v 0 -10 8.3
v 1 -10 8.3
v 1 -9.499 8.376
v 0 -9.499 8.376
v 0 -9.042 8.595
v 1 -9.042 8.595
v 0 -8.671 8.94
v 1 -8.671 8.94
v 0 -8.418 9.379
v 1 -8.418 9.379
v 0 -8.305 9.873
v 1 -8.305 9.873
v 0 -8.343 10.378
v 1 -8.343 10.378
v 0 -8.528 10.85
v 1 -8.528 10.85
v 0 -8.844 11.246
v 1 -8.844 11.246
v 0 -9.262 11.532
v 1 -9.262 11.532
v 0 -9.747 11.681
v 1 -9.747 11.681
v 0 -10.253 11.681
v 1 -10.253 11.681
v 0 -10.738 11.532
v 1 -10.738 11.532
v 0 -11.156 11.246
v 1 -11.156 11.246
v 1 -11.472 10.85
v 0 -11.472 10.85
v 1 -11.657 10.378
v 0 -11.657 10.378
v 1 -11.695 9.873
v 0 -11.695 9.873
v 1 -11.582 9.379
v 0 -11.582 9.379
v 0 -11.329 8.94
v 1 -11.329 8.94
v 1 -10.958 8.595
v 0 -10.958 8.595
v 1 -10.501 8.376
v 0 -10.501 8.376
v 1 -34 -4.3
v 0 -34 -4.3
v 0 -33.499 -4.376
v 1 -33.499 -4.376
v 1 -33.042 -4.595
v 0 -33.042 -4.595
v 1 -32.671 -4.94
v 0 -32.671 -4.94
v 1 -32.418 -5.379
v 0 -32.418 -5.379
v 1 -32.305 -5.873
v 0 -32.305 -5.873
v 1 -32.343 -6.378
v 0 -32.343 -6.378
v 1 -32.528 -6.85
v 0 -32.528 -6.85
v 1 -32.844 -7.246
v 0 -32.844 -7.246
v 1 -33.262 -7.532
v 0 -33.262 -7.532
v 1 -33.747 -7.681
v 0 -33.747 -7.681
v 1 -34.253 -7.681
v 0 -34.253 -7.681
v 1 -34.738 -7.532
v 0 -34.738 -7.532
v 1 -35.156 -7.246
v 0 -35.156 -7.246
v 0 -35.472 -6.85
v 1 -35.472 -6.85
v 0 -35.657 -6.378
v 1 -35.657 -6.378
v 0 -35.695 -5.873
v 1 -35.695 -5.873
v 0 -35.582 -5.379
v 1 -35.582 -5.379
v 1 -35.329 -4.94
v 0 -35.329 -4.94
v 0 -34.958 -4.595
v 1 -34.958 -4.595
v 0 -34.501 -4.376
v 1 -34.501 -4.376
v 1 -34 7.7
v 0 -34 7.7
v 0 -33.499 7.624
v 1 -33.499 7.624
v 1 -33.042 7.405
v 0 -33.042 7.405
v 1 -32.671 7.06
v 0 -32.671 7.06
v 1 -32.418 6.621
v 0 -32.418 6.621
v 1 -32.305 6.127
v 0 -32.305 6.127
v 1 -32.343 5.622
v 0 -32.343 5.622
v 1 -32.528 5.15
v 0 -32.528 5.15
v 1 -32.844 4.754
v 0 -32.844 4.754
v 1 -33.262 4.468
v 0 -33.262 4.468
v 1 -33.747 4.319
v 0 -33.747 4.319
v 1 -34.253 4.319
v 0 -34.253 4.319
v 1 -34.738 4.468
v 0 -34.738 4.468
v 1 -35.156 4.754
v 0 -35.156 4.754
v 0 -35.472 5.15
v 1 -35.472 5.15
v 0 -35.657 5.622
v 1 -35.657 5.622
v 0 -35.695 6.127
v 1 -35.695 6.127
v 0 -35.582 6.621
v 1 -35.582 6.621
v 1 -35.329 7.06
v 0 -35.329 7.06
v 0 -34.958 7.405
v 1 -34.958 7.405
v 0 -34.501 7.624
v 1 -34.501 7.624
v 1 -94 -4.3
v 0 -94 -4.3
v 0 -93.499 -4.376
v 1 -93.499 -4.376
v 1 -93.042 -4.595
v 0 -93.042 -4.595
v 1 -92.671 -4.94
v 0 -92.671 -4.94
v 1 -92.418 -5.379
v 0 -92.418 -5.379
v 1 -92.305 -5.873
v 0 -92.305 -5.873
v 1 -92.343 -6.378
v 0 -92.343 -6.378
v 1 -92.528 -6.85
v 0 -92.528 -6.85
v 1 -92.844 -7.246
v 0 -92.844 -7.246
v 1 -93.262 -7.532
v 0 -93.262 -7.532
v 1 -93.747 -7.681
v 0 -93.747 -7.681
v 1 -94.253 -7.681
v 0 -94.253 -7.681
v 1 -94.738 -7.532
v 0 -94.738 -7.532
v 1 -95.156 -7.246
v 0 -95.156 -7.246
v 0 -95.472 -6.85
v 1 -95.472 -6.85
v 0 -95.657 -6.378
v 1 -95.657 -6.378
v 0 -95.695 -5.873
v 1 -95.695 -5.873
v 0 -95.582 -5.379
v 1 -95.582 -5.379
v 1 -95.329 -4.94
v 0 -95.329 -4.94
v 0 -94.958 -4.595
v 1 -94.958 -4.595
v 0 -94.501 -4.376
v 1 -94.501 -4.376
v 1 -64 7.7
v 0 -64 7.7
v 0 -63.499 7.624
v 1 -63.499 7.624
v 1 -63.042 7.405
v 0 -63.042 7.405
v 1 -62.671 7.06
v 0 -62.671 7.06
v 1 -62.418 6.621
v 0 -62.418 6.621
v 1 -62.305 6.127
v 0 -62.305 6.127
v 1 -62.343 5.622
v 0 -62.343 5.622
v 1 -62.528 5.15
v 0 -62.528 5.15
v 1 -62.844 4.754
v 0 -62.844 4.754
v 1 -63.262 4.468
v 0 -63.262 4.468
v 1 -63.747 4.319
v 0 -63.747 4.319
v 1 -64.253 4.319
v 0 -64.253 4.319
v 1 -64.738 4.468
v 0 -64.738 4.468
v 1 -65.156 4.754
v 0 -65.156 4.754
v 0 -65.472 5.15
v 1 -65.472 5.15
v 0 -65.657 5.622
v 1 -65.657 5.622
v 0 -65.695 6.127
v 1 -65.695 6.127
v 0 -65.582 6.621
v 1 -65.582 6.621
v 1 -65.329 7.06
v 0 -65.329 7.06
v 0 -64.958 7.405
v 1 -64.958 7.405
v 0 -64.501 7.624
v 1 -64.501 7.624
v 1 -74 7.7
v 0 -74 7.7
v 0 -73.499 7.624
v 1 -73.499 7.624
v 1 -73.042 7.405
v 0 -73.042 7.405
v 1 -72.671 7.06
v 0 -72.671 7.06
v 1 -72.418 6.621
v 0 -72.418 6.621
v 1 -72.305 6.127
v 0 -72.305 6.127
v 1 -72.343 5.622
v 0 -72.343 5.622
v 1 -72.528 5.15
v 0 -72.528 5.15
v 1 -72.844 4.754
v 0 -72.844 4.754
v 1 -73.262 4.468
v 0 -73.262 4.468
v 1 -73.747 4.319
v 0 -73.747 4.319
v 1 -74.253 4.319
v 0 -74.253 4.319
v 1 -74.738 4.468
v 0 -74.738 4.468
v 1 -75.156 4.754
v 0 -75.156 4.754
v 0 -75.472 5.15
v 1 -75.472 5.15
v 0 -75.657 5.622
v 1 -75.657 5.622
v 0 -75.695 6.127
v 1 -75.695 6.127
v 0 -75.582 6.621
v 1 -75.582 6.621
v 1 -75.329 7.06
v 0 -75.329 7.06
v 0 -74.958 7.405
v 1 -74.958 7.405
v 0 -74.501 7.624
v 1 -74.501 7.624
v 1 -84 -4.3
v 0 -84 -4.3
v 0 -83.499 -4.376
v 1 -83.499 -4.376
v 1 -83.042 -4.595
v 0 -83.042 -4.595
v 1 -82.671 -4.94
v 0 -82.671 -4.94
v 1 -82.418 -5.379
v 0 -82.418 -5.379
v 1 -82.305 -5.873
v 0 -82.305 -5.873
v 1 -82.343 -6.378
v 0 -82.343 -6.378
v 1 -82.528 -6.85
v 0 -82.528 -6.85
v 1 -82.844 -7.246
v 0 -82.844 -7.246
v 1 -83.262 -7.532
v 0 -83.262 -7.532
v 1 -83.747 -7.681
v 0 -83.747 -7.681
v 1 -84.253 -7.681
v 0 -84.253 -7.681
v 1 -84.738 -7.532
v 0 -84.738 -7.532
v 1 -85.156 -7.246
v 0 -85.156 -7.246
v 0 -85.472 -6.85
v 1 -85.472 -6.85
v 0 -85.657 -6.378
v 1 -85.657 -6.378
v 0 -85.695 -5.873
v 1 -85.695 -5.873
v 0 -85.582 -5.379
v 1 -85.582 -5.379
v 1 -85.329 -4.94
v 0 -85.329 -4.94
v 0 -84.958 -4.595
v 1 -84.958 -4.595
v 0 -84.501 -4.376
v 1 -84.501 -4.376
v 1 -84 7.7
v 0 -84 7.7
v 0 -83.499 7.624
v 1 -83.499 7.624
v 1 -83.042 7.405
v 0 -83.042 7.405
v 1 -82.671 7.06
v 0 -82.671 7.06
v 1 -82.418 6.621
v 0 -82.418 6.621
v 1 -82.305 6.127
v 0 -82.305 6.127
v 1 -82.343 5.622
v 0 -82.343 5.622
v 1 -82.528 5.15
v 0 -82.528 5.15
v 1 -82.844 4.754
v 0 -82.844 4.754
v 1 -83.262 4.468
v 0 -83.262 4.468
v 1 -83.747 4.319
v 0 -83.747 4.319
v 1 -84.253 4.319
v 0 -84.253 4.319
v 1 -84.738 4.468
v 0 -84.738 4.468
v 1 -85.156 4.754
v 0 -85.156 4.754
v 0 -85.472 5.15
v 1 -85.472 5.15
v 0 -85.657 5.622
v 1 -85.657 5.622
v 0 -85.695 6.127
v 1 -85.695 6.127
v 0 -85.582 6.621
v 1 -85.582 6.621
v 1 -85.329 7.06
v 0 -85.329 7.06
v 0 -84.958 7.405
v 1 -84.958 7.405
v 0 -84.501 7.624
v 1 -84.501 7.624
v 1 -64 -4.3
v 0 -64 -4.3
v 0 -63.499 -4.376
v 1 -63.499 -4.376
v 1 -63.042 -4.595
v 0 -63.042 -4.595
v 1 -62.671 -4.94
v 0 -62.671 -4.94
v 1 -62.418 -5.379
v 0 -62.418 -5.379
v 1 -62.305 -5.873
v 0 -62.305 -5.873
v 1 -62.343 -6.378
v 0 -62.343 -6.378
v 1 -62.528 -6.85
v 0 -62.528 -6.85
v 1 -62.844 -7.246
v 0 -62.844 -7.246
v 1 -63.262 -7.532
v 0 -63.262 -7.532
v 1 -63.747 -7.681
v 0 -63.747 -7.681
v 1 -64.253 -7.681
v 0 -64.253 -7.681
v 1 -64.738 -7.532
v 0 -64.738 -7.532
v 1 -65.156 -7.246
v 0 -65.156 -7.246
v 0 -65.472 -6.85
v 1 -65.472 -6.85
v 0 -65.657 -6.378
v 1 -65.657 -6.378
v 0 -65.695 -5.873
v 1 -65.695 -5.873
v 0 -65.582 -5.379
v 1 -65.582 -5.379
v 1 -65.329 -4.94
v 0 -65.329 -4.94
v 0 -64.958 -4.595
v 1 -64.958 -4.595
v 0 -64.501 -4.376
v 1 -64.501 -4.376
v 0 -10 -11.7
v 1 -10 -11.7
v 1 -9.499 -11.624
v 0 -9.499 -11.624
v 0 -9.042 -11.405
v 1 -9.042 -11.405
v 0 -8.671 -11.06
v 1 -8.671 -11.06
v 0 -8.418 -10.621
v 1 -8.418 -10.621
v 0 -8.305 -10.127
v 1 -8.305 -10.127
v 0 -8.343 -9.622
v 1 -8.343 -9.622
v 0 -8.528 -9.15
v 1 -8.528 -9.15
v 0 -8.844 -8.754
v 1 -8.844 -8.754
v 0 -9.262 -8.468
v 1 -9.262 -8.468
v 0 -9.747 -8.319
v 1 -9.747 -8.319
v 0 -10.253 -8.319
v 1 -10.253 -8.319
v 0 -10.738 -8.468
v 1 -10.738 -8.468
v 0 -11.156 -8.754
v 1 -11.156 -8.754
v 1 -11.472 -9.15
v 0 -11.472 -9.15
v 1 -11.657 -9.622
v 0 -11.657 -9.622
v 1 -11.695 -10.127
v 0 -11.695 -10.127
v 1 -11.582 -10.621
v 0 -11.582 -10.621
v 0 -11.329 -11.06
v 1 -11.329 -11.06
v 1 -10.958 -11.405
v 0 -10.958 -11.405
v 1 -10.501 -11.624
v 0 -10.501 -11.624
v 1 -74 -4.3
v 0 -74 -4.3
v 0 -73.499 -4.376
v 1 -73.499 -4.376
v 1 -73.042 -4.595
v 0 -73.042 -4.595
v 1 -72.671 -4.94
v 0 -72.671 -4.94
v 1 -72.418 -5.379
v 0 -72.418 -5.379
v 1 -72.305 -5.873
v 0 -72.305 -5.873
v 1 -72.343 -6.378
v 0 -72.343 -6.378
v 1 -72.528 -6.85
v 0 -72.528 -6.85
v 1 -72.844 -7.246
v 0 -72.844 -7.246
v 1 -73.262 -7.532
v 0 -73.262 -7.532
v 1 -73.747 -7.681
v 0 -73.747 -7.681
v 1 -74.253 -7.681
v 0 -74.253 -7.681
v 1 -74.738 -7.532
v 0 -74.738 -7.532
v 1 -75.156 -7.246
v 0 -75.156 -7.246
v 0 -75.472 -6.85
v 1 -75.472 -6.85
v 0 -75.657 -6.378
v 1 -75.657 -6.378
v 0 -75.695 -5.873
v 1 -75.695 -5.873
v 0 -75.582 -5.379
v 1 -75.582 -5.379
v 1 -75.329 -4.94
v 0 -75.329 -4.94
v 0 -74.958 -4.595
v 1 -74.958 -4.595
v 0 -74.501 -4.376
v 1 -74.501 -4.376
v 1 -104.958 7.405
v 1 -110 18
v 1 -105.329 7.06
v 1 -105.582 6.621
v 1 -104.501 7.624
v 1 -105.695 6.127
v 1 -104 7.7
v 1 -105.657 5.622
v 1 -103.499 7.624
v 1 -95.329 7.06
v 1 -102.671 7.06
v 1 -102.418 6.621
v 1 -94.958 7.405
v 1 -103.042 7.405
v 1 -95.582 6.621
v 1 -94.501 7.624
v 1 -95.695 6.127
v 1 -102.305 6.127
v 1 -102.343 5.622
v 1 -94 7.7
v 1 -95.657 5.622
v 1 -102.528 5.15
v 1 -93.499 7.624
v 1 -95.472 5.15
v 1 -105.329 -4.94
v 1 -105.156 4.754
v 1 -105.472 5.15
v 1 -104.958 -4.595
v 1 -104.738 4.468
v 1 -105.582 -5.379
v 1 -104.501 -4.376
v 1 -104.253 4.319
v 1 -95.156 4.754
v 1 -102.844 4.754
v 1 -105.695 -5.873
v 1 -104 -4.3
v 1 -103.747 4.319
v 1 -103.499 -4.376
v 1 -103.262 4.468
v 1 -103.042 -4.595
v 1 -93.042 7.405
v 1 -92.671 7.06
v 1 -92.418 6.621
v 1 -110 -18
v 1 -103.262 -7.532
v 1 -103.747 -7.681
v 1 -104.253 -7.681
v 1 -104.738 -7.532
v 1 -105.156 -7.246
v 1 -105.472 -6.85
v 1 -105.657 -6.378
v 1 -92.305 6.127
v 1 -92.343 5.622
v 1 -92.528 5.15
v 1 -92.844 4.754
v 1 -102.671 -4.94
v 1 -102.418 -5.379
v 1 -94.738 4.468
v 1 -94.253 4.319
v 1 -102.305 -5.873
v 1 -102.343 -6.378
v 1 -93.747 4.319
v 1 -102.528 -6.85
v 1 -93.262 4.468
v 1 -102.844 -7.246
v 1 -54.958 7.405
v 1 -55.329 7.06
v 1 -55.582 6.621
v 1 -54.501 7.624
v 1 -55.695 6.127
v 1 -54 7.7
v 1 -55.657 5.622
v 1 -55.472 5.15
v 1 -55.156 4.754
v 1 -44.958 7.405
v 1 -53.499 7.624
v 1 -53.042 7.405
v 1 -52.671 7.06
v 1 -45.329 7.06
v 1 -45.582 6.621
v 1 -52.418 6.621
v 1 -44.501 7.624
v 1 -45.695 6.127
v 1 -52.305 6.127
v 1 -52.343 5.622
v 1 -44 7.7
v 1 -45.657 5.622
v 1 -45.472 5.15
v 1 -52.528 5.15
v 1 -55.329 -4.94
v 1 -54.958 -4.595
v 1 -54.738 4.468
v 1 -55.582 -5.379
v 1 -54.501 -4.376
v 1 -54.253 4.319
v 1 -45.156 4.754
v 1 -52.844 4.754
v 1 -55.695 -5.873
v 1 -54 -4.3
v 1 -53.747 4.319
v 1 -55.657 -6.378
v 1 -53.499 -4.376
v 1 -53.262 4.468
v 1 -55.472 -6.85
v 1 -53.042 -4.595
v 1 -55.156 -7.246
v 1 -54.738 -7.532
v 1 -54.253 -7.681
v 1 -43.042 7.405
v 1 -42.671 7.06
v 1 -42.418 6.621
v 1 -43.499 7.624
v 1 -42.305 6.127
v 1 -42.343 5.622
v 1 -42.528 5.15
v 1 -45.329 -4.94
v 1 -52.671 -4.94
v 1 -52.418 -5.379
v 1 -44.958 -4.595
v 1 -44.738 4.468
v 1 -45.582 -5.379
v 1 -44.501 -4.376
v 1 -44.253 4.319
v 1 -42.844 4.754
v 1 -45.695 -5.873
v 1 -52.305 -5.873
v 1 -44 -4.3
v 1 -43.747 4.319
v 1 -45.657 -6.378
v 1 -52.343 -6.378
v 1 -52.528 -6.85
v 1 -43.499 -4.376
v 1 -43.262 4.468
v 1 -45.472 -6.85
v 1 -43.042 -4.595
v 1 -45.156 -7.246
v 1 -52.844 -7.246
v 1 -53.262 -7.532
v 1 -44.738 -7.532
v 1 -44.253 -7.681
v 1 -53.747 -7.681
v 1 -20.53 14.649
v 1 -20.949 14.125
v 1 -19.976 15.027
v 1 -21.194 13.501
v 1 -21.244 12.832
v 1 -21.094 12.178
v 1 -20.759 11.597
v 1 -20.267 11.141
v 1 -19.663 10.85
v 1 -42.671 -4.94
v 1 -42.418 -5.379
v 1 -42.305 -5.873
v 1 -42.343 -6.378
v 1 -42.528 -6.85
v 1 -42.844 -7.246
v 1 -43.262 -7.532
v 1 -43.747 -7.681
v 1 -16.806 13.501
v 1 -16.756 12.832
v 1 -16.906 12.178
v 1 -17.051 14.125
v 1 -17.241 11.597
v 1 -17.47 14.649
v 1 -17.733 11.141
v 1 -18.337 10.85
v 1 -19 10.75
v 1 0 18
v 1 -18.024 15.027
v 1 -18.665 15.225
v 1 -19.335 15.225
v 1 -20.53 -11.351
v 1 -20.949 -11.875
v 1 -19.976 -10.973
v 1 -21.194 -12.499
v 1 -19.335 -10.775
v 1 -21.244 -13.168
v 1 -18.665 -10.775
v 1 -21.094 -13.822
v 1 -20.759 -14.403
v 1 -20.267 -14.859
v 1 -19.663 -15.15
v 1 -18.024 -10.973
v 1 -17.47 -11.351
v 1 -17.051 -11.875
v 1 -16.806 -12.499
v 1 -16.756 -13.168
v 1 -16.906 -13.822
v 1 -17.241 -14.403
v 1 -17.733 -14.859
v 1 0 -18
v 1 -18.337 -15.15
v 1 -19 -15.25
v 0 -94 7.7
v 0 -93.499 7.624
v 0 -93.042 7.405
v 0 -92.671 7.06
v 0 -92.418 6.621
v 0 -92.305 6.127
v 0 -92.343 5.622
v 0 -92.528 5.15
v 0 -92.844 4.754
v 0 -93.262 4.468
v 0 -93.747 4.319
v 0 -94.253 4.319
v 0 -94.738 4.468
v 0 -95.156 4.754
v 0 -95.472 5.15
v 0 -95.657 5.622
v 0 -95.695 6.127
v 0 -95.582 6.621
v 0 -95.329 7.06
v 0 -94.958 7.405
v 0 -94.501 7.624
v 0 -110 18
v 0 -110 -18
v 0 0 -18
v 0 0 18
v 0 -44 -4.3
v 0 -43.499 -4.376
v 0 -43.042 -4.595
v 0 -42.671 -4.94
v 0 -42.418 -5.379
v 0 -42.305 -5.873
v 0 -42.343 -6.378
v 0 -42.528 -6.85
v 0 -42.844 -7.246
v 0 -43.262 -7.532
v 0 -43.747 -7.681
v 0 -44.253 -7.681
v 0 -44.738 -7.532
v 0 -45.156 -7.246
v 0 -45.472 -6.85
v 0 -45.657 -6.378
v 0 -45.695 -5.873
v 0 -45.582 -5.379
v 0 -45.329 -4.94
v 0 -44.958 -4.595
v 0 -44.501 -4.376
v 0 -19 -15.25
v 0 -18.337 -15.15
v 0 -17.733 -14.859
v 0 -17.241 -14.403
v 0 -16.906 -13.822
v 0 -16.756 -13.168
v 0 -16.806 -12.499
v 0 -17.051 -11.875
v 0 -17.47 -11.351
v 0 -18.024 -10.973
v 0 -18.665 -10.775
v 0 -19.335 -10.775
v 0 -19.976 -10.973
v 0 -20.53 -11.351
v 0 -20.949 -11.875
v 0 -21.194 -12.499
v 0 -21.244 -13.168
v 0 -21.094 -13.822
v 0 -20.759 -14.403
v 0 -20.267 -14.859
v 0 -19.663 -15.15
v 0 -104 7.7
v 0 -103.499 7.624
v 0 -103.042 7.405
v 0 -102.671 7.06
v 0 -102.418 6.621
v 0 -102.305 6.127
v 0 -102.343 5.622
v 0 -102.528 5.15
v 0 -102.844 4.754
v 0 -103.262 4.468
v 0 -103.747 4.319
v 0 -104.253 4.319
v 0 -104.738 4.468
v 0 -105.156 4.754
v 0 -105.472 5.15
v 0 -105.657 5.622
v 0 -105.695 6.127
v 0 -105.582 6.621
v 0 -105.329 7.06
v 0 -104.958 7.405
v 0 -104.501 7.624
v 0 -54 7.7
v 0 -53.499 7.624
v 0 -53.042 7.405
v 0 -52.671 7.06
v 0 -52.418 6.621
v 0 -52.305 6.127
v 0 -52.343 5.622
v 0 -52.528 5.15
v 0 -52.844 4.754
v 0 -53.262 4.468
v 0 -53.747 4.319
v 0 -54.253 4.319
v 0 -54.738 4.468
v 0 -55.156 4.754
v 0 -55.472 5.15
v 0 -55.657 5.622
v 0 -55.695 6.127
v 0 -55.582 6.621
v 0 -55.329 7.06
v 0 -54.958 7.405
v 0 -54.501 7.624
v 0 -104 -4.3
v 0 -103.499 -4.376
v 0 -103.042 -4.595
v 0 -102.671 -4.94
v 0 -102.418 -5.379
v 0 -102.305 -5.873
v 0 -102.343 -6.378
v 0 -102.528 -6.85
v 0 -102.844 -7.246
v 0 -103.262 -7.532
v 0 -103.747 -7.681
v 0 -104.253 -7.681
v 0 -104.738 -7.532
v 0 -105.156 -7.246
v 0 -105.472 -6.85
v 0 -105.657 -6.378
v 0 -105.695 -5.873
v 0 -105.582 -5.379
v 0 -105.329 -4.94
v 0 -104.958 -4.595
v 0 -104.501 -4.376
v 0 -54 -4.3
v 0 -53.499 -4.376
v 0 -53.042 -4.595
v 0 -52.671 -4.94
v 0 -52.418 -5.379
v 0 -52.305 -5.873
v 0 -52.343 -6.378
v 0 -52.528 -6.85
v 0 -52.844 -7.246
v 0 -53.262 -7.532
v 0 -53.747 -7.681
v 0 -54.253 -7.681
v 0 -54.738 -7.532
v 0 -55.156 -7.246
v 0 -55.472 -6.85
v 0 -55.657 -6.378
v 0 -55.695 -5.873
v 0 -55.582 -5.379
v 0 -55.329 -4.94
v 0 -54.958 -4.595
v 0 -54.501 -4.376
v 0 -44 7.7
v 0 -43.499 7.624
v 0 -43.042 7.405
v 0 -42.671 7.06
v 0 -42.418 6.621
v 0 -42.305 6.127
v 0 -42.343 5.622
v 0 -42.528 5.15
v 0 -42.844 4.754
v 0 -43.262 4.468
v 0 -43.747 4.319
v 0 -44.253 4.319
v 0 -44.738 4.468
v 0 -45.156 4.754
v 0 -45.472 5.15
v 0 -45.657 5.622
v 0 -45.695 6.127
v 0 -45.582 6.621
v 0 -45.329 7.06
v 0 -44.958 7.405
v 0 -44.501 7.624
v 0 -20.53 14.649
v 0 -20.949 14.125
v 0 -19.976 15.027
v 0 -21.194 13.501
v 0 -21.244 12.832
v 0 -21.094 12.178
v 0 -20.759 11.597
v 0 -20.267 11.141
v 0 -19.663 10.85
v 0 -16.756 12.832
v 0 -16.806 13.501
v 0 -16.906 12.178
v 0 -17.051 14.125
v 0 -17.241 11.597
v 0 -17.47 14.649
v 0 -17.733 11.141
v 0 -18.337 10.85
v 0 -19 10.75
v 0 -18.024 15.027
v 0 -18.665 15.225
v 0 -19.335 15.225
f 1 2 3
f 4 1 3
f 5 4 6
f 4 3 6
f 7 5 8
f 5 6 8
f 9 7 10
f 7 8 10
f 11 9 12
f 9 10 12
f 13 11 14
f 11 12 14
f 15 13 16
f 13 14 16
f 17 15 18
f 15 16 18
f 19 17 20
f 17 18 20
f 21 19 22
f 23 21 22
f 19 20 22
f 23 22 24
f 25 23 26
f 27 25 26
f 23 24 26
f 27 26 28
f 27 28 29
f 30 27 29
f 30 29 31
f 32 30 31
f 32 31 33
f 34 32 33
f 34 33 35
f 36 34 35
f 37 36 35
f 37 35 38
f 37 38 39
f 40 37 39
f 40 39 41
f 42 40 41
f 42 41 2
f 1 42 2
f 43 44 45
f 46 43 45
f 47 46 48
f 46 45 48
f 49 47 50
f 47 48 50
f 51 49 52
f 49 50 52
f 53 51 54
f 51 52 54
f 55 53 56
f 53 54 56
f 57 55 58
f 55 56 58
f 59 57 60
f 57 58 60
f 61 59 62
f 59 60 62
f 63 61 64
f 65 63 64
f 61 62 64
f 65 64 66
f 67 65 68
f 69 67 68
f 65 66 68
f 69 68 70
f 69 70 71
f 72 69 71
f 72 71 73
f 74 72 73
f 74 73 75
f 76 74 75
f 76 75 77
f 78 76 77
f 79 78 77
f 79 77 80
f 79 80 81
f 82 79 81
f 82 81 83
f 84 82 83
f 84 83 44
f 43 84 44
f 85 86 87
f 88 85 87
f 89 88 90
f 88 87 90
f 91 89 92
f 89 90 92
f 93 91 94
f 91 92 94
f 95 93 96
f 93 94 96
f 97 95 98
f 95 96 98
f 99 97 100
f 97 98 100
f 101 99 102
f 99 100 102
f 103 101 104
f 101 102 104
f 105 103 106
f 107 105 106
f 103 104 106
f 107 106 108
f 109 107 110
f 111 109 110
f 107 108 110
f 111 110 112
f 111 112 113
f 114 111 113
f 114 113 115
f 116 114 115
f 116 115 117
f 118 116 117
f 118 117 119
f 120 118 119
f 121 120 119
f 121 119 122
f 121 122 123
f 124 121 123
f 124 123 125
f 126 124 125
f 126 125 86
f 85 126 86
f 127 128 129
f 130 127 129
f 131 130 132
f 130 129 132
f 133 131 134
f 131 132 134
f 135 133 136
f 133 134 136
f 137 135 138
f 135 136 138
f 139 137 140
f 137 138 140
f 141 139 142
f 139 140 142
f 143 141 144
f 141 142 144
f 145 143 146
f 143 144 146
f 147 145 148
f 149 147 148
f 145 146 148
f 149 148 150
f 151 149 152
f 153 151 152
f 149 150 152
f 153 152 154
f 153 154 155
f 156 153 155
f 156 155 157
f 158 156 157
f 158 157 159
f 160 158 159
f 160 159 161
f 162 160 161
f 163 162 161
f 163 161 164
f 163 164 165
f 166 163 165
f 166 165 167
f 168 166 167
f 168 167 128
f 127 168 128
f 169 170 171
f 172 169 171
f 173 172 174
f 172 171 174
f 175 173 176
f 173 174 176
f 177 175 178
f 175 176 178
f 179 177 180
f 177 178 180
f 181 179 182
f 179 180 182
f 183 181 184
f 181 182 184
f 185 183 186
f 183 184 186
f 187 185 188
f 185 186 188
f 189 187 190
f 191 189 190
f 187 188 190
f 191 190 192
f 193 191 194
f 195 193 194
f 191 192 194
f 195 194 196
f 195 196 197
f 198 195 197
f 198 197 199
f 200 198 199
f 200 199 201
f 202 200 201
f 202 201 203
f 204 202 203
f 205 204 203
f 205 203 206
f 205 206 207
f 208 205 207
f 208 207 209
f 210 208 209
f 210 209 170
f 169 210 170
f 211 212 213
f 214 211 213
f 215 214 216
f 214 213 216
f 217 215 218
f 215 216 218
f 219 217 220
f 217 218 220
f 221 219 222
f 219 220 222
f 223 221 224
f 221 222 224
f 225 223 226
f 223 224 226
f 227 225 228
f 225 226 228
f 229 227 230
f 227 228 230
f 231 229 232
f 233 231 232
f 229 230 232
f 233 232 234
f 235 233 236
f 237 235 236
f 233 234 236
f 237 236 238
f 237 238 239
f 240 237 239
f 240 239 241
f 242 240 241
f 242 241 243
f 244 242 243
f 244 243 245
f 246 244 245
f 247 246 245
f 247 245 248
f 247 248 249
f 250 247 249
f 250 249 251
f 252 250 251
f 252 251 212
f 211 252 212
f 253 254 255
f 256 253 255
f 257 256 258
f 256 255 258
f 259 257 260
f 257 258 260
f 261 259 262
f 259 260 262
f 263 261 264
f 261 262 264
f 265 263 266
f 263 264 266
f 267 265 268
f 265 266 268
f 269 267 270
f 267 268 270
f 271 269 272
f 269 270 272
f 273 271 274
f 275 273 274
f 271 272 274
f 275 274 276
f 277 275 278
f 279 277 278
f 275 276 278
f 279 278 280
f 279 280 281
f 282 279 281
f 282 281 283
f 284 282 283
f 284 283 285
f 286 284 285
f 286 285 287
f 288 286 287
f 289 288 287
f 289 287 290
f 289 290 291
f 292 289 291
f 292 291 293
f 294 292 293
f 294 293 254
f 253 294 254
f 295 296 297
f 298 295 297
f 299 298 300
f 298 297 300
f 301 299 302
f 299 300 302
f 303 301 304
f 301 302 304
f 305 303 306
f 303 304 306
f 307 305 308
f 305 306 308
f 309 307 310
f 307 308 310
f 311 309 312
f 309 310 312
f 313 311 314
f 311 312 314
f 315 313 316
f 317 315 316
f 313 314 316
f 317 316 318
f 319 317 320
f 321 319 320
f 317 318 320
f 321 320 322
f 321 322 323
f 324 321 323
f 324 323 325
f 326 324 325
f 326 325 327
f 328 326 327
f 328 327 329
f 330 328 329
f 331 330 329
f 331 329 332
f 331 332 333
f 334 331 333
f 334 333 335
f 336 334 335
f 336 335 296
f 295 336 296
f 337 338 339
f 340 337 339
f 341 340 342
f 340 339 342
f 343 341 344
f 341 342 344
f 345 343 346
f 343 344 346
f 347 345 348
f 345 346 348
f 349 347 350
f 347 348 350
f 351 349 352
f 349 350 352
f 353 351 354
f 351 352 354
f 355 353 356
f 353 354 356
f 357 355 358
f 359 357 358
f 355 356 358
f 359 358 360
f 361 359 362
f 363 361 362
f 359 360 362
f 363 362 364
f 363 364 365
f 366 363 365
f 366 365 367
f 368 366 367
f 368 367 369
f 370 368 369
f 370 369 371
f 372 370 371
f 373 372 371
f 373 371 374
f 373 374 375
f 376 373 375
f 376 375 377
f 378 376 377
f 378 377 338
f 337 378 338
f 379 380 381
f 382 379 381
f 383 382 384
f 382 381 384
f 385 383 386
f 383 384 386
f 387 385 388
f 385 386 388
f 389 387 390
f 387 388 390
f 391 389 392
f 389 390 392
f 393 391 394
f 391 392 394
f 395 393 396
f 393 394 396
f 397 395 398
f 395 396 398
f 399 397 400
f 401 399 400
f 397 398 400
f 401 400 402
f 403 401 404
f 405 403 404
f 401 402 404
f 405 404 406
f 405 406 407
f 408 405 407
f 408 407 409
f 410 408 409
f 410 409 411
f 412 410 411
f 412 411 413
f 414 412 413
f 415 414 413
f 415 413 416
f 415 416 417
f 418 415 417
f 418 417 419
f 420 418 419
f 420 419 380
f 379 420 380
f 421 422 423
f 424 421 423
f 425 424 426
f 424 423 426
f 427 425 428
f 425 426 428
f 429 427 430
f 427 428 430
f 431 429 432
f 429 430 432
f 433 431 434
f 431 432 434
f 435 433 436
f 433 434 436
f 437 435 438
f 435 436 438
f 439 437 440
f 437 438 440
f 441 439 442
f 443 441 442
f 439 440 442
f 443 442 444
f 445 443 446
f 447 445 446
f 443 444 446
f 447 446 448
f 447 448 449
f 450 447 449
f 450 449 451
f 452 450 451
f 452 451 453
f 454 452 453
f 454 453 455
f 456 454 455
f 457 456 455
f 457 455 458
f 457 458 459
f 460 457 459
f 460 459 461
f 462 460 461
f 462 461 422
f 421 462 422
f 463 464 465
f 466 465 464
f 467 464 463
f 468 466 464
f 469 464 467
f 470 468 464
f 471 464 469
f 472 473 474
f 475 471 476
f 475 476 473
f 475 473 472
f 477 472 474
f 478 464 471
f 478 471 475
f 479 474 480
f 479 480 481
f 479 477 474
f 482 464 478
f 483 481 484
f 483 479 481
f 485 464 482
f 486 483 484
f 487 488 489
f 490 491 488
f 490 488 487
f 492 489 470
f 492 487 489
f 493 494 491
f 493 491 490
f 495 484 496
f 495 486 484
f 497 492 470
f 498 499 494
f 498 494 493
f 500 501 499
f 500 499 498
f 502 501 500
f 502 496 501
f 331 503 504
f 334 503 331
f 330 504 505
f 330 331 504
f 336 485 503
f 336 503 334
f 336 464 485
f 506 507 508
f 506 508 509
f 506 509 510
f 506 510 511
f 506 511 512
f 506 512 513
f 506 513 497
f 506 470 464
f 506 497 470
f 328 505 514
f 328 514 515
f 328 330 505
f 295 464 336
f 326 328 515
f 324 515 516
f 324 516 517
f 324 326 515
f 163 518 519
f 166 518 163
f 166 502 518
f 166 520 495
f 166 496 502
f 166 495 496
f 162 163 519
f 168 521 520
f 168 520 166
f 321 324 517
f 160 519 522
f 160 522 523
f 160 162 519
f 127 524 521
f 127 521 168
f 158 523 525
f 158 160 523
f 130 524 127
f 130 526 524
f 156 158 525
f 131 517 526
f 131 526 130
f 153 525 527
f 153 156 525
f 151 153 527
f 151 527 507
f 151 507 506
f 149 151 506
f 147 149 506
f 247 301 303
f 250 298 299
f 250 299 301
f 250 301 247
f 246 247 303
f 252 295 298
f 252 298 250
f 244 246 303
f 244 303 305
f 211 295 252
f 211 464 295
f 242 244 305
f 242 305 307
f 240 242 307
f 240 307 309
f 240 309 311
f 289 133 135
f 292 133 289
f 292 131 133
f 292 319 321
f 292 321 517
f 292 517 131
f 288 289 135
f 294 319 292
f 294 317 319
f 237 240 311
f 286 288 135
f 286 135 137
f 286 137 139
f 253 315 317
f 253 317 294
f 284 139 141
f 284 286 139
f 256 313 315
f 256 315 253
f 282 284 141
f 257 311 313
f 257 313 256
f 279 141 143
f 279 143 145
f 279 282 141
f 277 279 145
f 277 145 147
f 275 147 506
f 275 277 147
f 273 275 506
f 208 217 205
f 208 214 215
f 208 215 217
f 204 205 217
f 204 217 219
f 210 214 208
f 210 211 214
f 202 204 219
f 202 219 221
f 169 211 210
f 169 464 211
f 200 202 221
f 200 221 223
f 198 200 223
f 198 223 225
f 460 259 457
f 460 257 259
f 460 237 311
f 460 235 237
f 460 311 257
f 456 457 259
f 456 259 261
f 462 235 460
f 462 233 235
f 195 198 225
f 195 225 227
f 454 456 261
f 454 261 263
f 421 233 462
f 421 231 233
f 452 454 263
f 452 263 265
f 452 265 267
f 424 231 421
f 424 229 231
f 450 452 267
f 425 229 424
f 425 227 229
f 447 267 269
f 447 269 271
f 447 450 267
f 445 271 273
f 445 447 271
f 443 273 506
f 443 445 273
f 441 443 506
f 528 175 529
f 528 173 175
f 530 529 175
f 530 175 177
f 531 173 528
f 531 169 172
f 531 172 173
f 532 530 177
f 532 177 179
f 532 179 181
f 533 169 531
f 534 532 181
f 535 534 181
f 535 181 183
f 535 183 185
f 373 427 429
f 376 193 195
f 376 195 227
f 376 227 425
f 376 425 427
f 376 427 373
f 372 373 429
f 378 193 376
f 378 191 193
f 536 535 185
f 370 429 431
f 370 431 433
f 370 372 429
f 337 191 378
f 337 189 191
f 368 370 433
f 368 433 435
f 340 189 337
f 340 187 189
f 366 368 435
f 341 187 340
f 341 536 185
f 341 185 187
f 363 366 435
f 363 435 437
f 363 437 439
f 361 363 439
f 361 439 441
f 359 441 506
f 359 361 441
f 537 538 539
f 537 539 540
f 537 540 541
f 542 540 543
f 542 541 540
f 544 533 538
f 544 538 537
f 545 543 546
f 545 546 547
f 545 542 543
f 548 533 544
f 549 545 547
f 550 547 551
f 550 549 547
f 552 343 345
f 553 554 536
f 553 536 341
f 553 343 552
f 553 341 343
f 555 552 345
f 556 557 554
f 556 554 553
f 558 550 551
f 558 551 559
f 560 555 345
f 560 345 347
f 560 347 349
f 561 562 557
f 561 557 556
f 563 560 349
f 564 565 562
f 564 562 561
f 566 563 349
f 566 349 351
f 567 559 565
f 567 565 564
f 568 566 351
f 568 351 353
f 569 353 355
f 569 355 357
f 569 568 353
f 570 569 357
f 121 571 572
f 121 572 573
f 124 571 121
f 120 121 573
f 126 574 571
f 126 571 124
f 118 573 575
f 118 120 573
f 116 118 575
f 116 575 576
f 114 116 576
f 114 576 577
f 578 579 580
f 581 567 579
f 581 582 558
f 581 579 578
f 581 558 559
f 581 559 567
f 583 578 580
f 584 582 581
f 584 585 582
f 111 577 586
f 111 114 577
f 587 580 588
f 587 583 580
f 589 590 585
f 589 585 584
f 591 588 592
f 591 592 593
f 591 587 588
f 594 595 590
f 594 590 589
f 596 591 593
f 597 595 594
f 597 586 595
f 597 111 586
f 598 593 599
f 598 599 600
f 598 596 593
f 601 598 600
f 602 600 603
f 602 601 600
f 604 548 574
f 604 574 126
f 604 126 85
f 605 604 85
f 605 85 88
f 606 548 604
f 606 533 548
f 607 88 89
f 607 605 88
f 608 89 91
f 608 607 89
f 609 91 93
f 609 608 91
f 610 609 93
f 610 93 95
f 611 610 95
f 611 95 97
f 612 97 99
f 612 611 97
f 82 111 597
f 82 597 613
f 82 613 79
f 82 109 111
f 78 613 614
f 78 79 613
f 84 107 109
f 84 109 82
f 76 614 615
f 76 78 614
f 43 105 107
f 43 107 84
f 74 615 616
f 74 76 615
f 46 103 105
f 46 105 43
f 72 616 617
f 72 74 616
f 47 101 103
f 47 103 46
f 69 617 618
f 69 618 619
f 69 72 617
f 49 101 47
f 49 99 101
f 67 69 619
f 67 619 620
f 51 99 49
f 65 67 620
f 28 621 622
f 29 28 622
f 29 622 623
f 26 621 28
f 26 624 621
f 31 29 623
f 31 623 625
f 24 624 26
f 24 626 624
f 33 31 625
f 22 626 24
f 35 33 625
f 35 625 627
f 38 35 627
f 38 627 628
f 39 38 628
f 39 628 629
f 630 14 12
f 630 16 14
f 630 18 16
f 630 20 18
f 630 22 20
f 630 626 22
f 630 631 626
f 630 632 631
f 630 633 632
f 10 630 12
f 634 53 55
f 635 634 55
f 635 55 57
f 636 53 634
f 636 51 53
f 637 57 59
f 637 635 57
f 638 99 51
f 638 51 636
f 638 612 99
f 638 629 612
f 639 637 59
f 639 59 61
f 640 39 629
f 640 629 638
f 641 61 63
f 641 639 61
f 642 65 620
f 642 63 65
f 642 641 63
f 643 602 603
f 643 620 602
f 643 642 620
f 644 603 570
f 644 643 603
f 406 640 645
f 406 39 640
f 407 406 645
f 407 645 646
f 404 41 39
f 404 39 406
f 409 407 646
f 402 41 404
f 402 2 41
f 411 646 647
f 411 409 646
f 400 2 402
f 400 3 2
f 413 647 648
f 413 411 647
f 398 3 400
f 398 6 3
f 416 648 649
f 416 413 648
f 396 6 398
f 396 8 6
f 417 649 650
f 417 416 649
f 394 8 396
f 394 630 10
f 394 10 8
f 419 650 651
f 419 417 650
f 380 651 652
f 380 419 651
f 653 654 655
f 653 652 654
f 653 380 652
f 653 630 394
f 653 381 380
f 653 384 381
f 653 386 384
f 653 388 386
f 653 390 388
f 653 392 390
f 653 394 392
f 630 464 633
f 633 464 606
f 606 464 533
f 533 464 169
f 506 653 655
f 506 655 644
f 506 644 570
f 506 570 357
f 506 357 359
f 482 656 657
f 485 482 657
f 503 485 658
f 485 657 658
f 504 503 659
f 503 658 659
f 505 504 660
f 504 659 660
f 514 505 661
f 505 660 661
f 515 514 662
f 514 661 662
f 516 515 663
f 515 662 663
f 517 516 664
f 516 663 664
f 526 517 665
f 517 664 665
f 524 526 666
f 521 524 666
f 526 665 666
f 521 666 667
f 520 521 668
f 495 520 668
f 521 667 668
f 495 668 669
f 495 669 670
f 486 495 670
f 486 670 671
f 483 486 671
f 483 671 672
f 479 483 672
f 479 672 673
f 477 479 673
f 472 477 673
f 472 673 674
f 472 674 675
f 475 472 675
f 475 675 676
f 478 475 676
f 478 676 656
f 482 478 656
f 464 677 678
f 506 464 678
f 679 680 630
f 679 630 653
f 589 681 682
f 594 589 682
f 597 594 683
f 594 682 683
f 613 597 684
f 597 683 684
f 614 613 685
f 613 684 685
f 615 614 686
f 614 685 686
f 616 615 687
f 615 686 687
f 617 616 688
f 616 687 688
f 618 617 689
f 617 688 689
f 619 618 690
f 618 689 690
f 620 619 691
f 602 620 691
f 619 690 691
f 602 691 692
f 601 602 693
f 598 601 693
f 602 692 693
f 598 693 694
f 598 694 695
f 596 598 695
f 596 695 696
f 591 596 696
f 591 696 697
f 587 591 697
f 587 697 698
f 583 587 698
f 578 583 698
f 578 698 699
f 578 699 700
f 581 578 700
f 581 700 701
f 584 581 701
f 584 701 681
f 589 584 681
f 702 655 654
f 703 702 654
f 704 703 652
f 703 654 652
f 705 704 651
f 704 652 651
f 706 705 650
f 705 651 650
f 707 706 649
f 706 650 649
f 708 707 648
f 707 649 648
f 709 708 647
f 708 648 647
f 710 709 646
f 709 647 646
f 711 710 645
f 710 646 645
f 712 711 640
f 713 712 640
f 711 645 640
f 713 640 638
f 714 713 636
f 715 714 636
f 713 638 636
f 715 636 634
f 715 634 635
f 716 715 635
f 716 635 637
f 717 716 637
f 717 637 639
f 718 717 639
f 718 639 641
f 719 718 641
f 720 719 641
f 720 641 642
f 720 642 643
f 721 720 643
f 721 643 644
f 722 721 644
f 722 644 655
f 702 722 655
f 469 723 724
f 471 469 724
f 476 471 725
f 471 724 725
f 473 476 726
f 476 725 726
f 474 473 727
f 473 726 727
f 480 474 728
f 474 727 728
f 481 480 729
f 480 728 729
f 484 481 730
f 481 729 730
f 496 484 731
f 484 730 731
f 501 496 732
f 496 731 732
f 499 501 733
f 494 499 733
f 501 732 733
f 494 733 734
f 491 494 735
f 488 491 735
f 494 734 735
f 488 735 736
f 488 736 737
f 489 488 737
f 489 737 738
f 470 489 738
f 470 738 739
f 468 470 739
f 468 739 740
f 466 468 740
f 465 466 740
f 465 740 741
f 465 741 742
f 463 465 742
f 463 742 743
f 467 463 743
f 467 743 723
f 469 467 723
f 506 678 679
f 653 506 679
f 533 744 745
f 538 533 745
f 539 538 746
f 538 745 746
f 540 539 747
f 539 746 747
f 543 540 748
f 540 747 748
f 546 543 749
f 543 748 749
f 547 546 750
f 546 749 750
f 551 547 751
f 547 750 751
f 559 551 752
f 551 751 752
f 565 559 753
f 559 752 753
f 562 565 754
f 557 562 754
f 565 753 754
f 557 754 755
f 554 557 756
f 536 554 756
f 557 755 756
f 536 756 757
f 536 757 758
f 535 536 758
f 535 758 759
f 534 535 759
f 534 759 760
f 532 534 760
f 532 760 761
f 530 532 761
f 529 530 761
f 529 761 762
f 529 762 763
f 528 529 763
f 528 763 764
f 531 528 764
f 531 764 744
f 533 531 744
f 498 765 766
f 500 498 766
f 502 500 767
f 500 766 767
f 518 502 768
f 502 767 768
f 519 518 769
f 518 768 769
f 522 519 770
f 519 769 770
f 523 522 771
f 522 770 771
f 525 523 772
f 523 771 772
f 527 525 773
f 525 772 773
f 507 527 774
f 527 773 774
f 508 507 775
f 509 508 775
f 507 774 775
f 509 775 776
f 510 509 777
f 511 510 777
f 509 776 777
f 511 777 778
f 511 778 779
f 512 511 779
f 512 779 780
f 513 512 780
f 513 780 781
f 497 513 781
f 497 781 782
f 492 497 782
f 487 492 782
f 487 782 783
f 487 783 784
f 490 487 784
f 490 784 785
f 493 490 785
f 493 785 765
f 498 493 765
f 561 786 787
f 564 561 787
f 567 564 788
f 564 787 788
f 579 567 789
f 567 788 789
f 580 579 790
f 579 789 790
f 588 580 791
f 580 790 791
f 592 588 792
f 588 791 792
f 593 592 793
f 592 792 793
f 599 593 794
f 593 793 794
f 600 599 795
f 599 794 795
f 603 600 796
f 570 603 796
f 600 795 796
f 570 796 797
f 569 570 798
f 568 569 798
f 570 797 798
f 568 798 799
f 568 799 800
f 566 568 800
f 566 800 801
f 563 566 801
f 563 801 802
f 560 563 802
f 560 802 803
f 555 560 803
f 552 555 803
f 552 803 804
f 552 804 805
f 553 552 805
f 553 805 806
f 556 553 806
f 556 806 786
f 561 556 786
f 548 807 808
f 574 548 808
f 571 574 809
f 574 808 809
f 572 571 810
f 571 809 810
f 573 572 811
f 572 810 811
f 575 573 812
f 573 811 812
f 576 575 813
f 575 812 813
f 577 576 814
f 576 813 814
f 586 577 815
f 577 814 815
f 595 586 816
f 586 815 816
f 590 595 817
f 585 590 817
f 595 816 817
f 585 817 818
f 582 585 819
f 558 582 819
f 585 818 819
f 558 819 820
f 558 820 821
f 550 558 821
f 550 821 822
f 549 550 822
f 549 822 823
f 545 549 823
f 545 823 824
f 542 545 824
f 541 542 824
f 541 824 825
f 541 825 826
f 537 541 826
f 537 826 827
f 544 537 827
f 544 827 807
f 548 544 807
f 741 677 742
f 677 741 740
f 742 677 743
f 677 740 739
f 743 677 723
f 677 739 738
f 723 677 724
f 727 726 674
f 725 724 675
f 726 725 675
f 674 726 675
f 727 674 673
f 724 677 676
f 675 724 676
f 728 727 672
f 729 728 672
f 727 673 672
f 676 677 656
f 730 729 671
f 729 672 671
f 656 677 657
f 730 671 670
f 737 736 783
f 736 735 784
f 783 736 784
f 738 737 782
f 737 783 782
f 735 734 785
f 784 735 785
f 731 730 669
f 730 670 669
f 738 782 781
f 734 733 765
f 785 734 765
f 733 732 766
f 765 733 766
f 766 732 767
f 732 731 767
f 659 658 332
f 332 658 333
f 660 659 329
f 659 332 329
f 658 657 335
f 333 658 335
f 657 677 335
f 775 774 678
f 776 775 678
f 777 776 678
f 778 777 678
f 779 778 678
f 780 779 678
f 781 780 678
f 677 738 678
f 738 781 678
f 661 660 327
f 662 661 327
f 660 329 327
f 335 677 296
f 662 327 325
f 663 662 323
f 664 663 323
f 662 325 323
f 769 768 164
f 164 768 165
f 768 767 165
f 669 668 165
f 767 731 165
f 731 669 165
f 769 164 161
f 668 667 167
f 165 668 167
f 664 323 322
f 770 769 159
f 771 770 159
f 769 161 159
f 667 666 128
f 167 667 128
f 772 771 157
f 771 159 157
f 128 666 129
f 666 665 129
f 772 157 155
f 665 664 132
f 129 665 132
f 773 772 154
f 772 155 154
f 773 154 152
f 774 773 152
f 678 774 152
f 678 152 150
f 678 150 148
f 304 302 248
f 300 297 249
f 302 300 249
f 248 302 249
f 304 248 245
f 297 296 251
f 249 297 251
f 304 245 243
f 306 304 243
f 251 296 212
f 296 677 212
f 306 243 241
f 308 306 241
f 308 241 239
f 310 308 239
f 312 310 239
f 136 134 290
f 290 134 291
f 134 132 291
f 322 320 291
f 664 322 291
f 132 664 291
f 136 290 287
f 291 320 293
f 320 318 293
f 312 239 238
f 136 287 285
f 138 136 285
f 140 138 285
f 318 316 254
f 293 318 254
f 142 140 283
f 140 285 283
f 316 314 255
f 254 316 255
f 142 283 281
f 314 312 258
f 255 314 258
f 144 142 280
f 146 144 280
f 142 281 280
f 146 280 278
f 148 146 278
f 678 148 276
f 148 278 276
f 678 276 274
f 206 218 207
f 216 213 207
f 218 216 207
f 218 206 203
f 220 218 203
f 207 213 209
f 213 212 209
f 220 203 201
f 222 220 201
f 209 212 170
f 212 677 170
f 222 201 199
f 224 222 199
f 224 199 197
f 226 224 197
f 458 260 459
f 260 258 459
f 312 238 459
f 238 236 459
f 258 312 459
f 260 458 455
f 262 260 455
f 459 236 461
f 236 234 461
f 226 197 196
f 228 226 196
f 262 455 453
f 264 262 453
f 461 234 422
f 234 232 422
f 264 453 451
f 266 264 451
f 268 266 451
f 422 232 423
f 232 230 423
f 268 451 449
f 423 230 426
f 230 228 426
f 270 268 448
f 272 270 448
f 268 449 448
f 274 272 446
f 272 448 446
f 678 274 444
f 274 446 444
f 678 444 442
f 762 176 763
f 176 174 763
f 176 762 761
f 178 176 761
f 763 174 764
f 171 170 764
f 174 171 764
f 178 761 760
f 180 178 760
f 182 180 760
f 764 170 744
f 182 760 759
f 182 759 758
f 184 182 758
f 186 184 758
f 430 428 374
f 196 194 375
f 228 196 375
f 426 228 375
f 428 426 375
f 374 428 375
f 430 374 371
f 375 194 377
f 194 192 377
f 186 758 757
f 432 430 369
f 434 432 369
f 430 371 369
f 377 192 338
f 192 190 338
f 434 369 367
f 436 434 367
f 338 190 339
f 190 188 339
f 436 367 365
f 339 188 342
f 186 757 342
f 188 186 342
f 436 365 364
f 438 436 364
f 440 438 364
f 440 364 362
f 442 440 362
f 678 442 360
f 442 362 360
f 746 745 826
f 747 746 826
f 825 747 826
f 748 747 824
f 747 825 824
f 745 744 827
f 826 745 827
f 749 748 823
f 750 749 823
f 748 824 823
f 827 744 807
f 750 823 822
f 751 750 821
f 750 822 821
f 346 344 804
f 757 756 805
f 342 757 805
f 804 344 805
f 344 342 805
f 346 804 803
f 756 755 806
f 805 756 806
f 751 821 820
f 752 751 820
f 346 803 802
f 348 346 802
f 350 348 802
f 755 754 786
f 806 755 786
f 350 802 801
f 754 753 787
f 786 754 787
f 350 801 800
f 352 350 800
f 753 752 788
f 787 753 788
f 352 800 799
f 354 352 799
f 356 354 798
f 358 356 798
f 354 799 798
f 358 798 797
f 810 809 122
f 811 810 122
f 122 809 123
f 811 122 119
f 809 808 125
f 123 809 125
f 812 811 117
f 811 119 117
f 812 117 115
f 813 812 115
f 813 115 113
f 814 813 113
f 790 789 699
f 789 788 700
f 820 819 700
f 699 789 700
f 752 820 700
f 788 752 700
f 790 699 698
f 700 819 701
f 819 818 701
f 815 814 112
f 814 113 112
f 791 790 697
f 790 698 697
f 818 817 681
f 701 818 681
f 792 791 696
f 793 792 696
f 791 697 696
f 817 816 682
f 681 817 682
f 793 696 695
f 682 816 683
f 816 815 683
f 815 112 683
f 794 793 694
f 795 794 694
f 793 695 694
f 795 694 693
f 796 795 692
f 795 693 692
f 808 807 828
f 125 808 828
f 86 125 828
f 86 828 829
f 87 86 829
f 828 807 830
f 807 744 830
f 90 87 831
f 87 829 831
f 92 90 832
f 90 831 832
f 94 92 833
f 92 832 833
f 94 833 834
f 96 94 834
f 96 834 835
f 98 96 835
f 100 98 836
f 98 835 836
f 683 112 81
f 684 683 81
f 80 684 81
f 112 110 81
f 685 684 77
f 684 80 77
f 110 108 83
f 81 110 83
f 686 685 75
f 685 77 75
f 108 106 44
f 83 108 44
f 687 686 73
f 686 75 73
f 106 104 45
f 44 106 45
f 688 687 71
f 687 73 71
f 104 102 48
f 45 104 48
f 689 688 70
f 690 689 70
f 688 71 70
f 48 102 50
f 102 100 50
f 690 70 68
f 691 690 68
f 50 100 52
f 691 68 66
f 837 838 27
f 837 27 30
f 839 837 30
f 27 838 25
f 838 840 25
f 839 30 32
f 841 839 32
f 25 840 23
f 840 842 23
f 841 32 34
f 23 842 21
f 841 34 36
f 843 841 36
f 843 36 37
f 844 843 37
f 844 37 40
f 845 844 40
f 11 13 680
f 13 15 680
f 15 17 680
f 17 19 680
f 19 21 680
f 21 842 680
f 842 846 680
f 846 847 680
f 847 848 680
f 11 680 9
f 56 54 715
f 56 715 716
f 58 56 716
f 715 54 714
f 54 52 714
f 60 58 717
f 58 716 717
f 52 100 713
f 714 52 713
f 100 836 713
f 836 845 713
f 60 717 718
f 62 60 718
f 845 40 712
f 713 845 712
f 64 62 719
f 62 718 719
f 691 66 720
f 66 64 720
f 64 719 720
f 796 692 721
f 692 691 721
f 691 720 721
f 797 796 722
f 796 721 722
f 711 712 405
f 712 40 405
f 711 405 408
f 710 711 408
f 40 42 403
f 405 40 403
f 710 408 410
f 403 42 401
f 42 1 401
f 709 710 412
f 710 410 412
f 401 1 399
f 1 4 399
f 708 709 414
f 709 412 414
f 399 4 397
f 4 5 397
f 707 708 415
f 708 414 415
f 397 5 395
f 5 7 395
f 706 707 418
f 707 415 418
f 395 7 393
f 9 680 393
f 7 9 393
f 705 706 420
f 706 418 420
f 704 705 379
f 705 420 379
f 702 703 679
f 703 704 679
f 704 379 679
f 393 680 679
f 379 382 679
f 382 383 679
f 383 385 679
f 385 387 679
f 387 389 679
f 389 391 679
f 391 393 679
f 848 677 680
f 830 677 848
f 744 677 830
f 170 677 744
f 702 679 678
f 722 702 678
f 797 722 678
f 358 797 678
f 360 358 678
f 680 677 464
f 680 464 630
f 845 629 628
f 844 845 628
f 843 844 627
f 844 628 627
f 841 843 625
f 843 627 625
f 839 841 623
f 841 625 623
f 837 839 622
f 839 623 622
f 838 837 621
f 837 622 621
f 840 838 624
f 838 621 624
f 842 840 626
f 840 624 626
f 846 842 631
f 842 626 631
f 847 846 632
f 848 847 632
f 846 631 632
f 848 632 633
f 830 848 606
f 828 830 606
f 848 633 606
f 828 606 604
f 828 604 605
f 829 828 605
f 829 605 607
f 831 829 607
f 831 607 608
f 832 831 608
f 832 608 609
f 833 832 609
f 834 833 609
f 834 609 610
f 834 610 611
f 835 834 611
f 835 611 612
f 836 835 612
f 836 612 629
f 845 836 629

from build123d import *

# Parameters (mm, degrees)
SKETCH1_W            = 36
SKETCH1_H            = 110
BOSS_EXTRUDE1_DEPTH  = 1
M3_CLEARANCE_HOLE1_D = 3.4
M4_CLEARANCE_HOLE1_D = 4.5
M3_CLEARANCE_HOLE2_D = 3.4


with BuildPart() as part:
    # Sketch1 → Boss-Extrude1 (new body)
    with BuildSketch(Plane(origin=(0, 0, 0), x_dir=(0, 0, -1), z_dir=(1, 0, 0))):
        with Locations((0, -55)):
            Rectangle(SKETCH1_W, SKETCH1_H)
    extrude(amount=BOSS_EXTRUDE1_DEPTH)

    # M3 Clearance Hole1 (through all)
    with Locations(Plane.ZY):
        with Locations((-10, -10), (10, -10)):
            Hole(M3_CLEARANCE_HOLE1_D / 2)

    # M4 Clearance Hole1 (through all)
    with Locations(Plane.ZY):
        with Locations((-13, -19), (13, -19)):
            Hole(M4_CLEARANCE_HOLE1_D / 2)

    # M3 Clearance Hole2 (through all)
    with Locations(Plane(origin=(1, 0, 0), x_dir=(0, 0, -1), z_dir=(1, 0, 0))):
        with Locations((6, -104), (-6, -104), (6, -94), (-6, -94), (6, -84), (-6, -84), (6, -74), (-6, -74), (6, -64), (-6, -64), (6, -54), (-6, -54), (6, -44), (-6, -44), (6, -34), (-6, -34)):
            Hole(M3_CLEARANCE_HOLE2_D / 2)


solid = part.part
